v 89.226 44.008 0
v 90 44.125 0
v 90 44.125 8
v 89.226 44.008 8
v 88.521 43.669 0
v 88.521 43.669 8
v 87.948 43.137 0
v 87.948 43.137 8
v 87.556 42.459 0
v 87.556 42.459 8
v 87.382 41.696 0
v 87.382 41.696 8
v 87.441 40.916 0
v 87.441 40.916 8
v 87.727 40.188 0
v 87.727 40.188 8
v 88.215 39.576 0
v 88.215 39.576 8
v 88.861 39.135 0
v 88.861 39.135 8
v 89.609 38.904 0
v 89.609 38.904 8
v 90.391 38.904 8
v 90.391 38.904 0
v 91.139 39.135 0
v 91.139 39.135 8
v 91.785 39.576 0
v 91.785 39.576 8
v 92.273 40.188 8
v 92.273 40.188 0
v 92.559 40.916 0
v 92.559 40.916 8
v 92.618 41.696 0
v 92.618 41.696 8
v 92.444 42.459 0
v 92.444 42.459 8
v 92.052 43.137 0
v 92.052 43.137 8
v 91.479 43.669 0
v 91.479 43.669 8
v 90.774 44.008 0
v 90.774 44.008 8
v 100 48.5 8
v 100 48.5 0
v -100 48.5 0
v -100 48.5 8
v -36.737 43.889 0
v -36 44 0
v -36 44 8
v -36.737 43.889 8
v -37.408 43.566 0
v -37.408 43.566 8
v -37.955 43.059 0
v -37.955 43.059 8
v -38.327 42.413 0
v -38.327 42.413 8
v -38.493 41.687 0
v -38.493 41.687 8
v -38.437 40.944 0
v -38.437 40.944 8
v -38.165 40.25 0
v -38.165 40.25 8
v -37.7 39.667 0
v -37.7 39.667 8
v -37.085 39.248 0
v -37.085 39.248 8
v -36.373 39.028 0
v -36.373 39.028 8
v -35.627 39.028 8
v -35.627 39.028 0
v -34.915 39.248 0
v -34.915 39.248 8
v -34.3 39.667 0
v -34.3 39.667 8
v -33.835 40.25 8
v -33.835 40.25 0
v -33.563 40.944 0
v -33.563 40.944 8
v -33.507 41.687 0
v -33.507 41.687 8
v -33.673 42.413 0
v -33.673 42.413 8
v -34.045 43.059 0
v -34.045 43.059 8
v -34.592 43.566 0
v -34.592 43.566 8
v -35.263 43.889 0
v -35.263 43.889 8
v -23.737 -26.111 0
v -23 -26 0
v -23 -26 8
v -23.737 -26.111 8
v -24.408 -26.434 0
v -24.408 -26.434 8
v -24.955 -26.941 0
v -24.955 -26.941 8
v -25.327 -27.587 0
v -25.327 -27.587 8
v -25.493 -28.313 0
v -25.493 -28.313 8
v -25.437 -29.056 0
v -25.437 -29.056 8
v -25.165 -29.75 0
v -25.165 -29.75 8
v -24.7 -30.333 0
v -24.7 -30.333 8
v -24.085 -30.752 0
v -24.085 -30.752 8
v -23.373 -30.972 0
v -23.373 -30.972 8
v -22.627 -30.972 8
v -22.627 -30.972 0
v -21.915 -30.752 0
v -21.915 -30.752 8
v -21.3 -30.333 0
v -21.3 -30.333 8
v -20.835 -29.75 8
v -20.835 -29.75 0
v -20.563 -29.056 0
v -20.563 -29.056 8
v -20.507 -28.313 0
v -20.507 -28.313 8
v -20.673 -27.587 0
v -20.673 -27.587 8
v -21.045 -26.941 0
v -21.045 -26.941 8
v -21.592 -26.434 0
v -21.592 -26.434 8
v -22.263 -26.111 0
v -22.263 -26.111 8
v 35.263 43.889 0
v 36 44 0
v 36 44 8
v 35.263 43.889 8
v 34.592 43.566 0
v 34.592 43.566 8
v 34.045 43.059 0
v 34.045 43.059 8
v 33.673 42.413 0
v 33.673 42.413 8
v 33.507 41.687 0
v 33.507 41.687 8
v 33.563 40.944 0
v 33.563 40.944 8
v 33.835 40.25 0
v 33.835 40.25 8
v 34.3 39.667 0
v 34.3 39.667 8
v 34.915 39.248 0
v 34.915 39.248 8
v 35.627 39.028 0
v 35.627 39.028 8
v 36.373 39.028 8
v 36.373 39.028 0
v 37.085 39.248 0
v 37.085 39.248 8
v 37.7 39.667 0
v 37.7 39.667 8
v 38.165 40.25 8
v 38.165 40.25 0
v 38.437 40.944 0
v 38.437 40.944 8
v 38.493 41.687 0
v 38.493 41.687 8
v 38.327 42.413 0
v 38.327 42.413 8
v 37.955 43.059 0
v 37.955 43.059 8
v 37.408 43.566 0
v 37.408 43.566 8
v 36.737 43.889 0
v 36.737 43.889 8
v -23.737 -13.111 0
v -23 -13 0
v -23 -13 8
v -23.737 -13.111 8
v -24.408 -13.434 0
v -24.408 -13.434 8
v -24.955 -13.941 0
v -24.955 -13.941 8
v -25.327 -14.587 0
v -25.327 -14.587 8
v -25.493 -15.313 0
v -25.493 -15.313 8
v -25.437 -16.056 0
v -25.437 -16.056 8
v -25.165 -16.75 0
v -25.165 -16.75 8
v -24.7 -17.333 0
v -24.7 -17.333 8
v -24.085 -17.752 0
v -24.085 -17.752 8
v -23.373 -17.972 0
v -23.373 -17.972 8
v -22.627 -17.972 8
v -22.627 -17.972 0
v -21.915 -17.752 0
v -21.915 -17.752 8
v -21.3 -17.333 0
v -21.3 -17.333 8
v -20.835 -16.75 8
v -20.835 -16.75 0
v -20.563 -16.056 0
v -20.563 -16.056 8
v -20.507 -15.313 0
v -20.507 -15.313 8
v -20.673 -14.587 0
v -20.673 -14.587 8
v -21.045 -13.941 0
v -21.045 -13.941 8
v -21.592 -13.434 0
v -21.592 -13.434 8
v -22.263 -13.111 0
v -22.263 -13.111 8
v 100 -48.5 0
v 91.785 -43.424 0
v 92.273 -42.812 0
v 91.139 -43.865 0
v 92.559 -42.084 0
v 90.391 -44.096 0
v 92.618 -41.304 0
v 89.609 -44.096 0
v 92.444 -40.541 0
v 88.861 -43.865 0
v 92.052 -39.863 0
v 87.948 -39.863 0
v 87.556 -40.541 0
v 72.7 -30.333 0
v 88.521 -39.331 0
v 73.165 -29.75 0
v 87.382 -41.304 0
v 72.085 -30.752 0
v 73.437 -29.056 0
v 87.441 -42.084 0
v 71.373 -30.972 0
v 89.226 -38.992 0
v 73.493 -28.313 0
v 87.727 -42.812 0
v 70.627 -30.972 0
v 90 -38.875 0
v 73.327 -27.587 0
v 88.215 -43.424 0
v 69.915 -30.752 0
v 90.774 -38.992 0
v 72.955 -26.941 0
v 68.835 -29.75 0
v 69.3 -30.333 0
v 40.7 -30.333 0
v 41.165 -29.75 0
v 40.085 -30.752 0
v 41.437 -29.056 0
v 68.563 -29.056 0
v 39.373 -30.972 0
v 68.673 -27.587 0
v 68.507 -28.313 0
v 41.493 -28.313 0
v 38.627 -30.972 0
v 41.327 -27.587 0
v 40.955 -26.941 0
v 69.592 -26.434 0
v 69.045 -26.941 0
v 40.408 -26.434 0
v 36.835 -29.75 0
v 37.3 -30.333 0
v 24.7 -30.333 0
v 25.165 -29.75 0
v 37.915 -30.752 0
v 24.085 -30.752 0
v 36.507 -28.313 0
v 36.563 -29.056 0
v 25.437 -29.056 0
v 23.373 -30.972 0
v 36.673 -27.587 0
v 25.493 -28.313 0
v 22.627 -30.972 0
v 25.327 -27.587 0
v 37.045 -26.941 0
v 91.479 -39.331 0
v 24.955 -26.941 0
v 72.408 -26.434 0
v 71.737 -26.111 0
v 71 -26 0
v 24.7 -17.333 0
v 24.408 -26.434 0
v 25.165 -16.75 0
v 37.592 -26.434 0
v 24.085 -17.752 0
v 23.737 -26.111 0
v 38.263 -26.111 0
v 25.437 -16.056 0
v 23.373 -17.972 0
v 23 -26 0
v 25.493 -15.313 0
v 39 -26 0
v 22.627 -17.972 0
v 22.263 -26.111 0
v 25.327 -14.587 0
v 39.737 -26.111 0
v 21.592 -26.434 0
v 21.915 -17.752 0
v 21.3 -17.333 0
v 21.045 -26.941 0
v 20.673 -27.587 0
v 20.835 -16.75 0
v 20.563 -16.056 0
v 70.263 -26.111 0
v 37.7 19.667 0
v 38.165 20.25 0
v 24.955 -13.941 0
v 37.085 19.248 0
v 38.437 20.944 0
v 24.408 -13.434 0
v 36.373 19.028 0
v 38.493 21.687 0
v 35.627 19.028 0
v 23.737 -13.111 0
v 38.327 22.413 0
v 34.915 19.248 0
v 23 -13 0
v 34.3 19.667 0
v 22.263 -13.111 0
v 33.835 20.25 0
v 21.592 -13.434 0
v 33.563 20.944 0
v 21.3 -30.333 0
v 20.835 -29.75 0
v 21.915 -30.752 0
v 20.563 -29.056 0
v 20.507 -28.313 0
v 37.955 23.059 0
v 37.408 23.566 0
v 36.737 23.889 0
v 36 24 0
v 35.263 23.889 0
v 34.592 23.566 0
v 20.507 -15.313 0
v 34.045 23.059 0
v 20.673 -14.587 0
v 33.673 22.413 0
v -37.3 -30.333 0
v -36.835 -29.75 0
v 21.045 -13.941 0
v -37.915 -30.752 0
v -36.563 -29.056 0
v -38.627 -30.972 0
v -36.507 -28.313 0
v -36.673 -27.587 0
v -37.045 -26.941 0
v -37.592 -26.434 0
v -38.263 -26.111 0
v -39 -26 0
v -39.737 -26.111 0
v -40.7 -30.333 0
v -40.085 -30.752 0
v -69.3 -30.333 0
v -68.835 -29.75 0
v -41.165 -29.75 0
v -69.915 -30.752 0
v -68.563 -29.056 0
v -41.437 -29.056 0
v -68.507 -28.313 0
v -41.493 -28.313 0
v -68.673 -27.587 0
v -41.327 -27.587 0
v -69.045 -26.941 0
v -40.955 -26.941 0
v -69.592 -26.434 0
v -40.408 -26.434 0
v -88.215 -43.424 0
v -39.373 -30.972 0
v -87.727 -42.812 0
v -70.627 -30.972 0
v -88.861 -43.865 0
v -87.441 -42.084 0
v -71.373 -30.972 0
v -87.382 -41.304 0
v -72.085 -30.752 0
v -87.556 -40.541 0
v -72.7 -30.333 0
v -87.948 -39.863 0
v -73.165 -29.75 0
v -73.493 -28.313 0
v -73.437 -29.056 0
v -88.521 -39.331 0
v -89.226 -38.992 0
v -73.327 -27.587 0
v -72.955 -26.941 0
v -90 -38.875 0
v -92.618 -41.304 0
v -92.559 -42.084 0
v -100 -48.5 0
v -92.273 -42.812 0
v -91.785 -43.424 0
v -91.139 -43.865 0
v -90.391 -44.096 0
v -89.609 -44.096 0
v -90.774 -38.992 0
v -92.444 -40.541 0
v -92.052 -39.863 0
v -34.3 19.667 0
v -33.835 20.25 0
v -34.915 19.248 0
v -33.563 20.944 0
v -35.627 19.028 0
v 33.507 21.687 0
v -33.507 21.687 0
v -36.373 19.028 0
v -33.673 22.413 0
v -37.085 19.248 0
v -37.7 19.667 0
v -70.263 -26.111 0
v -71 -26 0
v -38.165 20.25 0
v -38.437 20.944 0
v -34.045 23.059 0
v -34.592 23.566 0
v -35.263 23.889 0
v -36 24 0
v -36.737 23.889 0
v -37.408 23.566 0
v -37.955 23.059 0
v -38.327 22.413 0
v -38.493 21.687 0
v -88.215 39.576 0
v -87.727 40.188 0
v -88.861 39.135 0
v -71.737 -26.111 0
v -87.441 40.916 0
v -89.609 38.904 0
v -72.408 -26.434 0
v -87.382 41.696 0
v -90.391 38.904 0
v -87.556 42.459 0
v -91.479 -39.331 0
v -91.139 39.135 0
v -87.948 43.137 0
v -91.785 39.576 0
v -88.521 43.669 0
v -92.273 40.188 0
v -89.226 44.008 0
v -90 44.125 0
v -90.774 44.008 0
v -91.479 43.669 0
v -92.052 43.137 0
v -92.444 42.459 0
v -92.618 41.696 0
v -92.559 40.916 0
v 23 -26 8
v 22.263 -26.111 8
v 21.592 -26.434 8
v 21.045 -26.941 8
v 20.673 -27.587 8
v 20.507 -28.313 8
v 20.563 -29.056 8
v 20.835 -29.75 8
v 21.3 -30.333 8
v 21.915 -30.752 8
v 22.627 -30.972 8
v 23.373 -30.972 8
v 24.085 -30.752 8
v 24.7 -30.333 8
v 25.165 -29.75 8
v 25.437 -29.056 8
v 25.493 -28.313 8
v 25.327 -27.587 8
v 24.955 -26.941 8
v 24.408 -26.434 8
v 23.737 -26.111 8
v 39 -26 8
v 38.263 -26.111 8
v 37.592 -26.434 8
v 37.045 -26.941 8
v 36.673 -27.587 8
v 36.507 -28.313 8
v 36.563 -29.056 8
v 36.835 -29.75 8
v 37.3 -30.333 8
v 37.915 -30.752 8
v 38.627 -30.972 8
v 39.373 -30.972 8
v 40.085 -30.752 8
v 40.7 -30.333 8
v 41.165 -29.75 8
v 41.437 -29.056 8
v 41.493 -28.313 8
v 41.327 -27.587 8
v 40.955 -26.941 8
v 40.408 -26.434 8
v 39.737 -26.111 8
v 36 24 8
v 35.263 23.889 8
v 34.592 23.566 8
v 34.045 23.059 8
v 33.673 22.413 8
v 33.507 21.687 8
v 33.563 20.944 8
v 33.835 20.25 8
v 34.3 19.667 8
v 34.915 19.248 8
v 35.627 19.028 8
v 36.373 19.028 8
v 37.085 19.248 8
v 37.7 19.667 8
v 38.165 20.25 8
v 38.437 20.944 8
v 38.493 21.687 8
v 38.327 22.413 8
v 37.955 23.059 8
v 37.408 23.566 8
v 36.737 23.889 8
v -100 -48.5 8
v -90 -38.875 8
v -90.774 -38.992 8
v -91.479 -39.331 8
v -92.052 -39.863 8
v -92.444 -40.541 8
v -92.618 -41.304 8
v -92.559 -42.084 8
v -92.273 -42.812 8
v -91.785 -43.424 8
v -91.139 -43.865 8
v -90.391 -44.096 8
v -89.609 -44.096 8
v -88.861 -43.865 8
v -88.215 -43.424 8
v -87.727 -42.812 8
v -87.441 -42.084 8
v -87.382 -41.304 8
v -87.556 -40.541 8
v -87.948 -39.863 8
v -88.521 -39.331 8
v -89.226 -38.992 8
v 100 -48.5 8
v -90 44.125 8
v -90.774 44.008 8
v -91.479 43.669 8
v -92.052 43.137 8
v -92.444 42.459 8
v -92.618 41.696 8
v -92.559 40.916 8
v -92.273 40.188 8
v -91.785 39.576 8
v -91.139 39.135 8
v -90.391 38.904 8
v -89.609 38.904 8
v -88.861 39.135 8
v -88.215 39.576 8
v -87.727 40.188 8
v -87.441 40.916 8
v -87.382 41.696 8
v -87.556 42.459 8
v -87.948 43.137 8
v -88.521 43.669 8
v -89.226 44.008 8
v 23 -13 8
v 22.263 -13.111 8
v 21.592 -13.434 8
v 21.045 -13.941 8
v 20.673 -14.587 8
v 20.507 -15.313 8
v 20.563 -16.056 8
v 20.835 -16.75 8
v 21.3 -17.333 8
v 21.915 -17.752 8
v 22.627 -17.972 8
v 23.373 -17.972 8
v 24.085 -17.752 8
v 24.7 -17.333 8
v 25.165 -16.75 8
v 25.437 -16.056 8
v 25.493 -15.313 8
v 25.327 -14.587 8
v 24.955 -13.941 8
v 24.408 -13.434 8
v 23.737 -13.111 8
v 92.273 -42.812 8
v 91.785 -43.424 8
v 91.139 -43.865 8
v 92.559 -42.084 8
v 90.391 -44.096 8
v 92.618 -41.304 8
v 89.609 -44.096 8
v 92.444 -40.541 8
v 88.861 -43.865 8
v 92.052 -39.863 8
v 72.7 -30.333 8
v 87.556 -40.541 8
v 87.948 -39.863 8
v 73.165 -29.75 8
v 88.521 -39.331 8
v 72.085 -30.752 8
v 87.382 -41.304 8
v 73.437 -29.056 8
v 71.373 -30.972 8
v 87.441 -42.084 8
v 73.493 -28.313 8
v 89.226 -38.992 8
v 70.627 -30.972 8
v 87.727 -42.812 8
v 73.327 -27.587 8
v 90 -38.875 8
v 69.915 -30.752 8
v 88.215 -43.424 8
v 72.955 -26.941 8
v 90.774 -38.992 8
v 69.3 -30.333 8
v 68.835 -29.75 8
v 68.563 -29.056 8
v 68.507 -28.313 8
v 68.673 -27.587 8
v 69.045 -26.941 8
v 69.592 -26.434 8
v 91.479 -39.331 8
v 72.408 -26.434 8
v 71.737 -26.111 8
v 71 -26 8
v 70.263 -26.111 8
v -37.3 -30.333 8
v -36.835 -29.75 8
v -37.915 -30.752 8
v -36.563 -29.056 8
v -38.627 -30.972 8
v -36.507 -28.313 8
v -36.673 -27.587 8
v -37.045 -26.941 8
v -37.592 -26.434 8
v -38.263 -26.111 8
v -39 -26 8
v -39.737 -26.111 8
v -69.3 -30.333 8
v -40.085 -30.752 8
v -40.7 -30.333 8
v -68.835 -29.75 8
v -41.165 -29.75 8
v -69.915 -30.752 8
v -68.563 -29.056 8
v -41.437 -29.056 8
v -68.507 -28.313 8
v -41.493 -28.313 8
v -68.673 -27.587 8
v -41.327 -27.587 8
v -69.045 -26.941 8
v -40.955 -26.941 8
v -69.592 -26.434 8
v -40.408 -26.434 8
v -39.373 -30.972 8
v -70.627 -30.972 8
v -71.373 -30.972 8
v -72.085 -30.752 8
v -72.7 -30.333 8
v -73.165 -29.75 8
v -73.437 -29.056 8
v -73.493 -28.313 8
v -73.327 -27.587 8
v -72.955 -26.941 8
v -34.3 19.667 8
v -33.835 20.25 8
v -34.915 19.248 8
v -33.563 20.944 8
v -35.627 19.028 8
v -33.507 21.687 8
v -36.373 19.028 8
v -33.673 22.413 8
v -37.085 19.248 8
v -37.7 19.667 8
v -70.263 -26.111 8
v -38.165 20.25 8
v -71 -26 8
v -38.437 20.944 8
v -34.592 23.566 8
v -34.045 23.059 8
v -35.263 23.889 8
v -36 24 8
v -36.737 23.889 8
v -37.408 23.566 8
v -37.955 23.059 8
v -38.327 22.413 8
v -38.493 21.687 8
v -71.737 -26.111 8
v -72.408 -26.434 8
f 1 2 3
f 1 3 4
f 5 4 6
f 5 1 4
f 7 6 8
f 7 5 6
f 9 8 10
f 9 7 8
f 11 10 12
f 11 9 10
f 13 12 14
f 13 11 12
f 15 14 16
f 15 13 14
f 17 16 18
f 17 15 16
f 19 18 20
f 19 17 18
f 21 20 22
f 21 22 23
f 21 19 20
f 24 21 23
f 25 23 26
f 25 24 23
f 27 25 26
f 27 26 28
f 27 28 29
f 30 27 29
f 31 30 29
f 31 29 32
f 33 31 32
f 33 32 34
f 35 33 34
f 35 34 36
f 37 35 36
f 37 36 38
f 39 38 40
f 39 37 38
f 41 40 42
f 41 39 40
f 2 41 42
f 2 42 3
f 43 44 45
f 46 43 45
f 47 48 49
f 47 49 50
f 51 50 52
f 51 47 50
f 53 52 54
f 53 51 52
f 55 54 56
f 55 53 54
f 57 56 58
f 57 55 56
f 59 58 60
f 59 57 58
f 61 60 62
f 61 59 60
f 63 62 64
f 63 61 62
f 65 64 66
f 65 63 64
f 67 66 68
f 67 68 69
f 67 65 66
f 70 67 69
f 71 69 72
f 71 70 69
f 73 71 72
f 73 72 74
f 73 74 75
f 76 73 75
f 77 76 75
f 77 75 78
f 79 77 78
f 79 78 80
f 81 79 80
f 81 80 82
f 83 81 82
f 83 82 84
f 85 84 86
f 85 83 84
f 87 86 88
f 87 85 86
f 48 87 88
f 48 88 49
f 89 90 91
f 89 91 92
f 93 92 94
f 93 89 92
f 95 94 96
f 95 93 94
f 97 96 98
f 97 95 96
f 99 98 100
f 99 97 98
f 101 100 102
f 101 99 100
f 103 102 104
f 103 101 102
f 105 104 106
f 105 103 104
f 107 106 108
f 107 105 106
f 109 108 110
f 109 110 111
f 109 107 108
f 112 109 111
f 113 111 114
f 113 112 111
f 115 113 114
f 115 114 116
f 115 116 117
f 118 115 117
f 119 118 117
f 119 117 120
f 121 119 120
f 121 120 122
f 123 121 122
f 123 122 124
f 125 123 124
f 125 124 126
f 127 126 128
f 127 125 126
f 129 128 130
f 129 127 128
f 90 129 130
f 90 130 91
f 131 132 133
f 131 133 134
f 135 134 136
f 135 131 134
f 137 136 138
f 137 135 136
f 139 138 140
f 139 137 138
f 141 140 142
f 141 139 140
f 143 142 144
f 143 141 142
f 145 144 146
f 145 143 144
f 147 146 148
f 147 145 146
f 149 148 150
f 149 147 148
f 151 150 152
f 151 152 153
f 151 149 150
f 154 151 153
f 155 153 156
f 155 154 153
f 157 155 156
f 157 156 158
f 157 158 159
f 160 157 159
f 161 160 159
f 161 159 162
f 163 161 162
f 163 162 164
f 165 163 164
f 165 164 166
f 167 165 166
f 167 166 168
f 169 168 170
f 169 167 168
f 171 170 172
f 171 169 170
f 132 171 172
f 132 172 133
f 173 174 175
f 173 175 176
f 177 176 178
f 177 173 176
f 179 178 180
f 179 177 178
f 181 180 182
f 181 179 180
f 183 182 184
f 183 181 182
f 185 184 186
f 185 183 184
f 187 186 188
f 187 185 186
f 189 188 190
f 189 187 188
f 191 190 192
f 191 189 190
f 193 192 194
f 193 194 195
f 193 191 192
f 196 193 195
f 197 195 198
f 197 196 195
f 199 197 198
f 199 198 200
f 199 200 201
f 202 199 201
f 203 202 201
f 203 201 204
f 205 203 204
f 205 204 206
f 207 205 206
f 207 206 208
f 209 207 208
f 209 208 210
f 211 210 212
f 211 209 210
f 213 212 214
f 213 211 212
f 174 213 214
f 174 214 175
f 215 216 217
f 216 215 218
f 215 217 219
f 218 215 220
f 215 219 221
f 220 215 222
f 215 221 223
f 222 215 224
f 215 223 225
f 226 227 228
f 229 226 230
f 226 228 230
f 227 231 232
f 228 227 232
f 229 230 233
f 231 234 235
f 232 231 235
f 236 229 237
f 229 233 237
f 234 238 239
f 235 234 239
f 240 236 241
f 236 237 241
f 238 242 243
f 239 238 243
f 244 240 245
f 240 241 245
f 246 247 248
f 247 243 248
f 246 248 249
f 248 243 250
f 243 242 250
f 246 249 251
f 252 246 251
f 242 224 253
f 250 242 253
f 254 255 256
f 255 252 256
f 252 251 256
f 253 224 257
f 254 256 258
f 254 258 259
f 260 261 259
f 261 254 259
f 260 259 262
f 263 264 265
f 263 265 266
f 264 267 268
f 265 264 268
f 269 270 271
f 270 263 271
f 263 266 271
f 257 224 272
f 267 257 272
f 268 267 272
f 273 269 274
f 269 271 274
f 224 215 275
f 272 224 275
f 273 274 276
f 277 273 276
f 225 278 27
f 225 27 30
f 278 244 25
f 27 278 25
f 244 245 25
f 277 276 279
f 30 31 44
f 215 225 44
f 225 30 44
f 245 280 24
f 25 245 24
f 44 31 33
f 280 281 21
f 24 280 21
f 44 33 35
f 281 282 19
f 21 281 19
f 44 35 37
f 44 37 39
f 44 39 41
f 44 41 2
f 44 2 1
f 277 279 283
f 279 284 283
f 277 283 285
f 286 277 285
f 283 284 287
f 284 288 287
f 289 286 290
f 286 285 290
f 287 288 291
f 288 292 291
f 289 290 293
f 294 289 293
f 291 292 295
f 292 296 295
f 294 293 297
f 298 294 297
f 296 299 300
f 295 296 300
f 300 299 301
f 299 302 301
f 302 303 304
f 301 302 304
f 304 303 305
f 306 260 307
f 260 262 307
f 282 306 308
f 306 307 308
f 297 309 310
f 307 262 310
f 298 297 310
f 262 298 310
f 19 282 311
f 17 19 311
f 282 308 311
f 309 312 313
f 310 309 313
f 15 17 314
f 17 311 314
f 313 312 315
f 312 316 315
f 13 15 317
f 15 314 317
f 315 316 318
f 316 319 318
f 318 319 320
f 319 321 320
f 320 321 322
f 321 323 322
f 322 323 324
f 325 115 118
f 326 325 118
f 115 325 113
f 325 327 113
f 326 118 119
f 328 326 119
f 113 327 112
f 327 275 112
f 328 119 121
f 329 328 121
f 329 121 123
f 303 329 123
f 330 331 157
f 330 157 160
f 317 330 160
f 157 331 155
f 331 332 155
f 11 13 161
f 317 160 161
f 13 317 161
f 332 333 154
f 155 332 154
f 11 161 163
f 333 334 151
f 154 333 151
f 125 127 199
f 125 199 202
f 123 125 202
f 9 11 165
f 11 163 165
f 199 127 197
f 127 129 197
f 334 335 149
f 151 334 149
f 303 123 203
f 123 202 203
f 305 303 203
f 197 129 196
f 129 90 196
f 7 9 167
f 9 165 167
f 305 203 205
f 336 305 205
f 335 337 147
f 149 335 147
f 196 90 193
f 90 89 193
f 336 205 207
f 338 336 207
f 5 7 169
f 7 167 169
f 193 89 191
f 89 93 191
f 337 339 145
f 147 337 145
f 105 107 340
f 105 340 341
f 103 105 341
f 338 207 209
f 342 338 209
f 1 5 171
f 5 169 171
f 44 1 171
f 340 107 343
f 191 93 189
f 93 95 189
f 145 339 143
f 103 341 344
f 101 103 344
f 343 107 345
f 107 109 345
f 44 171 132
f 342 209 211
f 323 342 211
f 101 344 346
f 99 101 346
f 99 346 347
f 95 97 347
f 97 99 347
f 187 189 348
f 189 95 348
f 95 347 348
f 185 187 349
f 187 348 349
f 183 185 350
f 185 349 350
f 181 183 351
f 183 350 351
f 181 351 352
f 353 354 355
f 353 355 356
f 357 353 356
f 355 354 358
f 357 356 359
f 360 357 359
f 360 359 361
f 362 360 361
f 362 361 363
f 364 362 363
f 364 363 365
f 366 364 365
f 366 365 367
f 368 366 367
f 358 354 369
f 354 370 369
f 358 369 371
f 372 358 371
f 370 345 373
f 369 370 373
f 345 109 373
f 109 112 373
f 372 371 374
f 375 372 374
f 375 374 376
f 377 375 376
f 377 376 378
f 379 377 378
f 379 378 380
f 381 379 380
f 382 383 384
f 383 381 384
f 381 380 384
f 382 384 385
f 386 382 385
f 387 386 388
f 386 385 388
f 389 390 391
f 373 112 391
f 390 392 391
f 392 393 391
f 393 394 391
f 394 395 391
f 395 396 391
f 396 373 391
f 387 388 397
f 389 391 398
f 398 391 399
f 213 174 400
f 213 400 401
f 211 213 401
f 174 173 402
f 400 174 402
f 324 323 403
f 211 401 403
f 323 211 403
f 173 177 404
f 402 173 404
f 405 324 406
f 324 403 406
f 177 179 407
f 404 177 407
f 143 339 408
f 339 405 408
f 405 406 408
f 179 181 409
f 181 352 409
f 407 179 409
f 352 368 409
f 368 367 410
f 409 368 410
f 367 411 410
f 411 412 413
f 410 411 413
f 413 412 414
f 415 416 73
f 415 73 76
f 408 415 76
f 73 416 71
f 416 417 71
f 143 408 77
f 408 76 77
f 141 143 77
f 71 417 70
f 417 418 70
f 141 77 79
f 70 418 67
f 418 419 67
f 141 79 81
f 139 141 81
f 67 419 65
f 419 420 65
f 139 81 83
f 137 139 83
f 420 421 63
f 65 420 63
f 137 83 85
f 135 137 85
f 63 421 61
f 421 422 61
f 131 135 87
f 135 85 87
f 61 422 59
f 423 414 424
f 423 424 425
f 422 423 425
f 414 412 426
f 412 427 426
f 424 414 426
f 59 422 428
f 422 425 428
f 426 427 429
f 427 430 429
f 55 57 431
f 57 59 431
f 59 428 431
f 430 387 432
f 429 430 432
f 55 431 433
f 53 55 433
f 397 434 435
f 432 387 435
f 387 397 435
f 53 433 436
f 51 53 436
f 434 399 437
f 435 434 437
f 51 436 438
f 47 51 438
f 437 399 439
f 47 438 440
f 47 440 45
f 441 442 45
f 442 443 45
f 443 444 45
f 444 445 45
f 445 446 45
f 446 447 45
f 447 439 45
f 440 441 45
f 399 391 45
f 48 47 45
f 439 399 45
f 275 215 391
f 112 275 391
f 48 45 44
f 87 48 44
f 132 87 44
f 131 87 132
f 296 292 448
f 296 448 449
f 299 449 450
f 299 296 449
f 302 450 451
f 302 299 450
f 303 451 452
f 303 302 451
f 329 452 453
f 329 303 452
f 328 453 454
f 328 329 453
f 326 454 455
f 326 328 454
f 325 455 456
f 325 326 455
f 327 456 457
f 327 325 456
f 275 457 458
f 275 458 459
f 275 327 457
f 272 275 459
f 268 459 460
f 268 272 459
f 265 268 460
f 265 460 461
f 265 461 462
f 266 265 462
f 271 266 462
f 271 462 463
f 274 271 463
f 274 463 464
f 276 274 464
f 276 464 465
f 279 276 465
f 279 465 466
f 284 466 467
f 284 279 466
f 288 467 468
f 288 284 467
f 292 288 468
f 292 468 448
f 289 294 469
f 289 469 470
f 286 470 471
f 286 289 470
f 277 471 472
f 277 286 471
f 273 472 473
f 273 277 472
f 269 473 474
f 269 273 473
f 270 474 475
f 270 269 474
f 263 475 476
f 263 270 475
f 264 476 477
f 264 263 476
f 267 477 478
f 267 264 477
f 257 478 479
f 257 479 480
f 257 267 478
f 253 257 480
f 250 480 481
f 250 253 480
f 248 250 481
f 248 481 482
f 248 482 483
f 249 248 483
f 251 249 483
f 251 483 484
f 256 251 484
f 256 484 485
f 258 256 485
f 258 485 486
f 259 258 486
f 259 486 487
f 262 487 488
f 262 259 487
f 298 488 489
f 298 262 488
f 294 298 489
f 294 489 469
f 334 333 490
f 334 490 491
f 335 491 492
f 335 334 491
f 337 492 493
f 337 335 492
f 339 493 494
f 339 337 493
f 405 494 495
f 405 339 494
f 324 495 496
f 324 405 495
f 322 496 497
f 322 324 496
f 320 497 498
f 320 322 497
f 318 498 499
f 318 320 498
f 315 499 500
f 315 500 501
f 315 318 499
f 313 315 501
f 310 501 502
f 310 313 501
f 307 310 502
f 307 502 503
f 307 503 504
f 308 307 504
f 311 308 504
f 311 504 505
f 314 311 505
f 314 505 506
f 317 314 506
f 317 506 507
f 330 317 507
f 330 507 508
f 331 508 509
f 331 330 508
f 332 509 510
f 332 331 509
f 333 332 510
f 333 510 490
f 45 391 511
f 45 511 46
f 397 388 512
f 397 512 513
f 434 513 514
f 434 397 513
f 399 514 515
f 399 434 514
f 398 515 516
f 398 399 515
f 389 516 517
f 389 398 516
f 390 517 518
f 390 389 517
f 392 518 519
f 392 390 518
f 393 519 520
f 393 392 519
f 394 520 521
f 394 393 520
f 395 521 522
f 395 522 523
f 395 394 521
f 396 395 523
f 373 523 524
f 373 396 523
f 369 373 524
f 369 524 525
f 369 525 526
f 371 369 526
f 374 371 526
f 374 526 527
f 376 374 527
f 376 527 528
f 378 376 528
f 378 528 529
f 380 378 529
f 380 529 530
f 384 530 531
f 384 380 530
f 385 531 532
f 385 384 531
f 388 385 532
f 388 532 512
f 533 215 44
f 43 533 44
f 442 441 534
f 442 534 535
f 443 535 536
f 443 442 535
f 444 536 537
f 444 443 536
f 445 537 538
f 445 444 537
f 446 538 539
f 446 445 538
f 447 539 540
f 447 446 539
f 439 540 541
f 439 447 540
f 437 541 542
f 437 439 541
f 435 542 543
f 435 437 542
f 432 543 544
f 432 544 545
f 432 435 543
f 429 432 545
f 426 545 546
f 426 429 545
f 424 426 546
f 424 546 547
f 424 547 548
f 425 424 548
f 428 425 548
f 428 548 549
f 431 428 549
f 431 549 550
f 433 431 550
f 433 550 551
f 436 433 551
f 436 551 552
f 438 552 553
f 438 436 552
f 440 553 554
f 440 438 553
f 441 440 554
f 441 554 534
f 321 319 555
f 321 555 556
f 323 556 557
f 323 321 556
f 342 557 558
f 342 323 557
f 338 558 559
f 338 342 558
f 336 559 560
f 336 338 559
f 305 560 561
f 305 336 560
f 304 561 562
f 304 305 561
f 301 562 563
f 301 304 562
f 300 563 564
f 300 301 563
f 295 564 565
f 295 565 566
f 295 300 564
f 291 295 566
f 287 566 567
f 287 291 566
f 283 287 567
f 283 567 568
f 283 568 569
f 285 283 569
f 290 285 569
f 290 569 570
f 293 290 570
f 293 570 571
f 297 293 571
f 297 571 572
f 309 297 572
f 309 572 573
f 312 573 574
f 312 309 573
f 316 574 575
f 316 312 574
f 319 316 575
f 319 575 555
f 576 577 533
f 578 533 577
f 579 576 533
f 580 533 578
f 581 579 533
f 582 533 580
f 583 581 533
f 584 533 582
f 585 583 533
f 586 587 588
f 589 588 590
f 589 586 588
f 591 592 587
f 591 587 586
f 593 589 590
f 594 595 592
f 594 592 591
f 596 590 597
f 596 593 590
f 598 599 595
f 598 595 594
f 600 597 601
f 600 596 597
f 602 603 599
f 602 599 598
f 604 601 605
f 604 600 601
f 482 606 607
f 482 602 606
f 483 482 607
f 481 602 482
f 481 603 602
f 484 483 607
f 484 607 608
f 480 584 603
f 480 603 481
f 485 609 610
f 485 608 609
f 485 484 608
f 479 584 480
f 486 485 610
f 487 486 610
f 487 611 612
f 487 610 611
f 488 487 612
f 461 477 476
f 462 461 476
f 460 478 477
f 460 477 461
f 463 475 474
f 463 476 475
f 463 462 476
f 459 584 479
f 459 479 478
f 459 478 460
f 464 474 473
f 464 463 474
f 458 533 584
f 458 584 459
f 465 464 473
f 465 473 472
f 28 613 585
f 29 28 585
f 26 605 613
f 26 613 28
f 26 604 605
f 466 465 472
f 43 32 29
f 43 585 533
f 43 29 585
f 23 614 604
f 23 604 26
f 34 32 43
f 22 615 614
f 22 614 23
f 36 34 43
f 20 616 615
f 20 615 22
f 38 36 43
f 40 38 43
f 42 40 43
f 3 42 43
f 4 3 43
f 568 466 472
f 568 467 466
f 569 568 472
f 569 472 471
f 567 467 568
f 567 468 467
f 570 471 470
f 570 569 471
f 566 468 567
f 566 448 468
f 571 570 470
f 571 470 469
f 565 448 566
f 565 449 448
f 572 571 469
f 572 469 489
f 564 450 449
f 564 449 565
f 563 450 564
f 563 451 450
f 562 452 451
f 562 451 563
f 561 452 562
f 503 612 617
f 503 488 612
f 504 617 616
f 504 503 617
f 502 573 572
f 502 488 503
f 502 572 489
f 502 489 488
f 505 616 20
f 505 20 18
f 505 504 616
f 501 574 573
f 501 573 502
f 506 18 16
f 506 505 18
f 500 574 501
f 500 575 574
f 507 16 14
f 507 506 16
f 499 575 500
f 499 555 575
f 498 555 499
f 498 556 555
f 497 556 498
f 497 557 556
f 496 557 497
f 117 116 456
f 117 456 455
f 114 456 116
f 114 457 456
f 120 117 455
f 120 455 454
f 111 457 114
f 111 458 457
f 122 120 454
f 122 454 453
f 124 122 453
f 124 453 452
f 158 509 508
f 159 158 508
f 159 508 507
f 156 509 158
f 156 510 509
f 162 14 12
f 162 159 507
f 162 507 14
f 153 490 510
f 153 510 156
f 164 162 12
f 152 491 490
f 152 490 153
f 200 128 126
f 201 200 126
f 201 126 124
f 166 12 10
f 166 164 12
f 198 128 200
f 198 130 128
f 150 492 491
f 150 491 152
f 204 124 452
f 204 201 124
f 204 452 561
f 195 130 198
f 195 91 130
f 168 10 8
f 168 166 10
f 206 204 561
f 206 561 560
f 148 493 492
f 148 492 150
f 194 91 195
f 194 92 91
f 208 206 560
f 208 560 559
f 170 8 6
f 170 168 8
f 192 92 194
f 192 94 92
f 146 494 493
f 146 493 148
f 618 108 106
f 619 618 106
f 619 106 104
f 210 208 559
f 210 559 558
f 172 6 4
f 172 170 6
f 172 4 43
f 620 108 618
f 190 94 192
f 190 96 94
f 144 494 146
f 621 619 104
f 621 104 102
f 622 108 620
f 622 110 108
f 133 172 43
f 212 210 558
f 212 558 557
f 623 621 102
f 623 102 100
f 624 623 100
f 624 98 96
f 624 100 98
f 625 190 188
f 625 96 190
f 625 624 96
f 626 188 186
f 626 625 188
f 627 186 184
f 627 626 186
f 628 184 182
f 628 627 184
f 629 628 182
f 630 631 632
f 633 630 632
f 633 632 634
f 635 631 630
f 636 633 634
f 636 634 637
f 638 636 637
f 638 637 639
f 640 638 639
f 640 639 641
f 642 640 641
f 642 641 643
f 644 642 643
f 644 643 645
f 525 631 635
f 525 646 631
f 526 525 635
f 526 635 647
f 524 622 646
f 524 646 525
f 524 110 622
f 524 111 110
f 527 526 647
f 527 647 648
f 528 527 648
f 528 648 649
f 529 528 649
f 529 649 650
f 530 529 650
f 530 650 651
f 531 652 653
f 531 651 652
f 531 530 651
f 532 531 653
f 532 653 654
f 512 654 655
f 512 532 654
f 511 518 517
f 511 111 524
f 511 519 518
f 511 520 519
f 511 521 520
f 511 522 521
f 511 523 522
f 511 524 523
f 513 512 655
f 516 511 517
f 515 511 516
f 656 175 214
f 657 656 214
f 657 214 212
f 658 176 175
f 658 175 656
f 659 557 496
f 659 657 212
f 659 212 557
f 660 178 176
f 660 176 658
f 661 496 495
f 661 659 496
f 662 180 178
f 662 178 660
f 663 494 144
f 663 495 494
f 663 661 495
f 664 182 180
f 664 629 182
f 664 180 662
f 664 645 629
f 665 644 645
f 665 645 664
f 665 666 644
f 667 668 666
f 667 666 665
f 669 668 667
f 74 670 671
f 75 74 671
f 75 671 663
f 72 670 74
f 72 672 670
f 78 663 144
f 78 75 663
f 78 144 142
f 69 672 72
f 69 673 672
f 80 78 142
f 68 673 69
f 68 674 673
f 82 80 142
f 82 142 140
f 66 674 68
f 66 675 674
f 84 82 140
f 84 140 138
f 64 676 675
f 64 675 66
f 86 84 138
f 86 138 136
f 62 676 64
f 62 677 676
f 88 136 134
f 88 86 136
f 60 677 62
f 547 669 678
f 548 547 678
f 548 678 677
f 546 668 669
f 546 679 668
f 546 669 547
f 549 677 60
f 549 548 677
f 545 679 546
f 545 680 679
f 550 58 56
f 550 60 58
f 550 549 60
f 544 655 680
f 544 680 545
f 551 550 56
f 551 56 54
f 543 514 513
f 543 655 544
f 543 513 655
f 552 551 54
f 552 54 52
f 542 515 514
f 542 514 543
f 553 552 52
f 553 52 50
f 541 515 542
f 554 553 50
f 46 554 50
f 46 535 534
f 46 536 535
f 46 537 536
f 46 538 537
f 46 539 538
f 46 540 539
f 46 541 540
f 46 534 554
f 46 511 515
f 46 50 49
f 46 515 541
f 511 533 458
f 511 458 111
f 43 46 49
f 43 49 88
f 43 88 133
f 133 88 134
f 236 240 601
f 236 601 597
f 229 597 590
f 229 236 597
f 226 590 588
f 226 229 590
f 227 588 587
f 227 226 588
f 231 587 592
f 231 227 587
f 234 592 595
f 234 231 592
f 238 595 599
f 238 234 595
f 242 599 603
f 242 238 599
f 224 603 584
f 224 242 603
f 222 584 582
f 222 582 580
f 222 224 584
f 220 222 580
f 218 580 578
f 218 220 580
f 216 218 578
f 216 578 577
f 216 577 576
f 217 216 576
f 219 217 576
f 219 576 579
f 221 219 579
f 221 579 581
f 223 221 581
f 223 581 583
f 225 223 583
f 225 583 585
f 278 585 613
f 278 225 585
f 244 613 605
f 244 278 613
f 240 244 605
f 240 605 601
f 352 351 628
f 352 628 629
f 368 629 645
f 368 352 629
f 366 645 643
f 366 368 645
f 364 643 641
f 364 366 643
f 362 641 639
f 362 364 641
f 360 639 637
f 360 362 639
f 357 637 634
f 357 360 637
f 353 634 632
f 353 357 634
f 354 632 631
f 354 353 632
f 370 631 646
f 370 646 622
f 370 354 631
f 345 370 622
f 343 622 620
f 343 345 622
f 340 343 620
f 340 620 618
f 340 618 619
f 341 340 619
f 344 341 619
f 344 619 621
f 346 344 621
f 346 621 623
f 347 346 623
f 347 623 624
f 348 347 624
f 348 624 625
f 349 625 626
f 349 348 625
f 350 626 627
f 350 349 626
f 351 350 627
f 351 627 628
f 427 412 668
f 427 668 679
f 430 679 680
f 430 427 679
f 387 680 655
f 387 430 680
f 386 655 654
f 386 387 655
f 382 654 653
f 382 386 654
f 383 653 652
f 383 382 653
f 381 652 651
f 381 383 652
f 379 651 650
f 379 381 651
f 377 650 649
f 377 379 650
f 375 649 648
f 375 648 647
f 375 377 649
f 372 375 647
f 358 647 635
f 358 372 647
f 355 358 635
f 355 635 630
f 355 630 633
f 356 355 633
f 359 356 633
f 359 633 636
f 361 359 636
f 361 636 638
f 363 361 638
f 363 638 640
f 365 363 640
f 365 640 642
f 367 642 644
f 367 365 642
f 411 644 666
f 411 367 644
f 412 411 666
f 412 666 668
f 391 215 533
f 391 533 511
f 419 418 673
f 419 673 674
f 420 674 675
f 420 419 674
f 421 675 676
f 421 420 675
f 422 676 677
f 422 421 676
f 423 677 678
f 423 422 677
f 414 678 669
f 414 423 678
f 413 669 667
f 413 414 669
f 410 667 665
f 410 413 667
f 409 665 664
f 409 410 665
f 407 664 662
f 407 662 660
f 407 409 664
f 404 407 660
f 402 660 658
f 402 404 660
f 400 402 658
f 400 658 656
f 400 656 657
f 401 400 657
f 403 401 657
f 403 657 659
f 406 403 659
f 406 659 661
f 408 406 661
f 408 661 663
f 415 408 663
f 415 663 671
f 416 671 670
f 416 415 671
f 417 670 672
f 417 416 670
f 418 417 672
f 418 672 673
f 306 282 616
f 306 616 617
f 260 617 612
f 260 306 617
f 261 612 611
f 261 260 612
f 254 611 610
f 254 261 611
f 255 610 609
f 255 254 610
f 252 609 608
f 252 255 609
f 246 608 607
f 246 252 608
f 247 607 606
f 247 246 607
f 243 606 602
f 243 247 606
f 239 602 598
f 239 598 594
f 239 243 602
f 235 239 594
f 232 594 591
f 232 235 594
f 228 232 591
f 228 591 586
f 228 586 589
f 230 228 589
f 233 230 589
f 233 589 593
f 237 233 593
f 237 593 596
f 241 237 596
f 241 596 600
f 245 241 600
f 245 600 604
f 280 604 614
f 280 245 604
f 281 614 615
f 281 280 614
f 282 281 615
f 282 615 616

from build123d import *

# Parameters (mm, degrees)
SKETCH_W   = 97
SKETCH_H   = 200
SKETCH_R   = 2.5
SKETCH_R_2 = 2.625
PAD_DEPTH  = 8


with BuildPart() as part:
    # Sketch → Pad (new body)
    with BuildSketch(Plane(origin=(0, 0, 0), x_dir=(0, 1, 0), z_dir=(0, 0, 1))):
        Rectangle(SKETCH_W, SKETCH_H)
        with Locations((-28.5, 71)):
            Circle(SKETCH_R, mode=Mode.SUBTRACT)
        with Locations((-28.5, 39)):
            Circle(SKETCH_R, mode=Mode.SUBTRACT)
        with Locations((-28.5, -39)):
            Circle(SKETCH_R, mode=Mode.SUBTRACT)
        with Locations((-28.5, -71)):
            Circle(SKETCH_R, mode=Mode.SUBTRACT)
        with Locations((-28.5, 23)):
            Circle(SKETCH_R, mode=Mode.SUBTRACT)
        with Locations((-15.5, 23)):
            Circle(SKETCH_R, mode=Mode.SUBTRACT)
        with Locations((-28.5, -23)):
            Circle(SKETCH_R, mode=Mode.SUBTRACT)
        with Locations((-15.5, -23)):
            Circle(SKETCH_R, mode=Mode.SUBTRACT)
        with Locations((-41.5, 90)):
            Circle(SKETCH_R_2, mode=Mode.SUBTRACT)
        with Locations((41.5, 90)):
            Circle(SKETCH_R_2, mode=Mode.SUBTRACT)
        with Locations((-41.5, -90)):
            Circle(SKETCH_R_2, mode=Mode.SUBTRACT)
        with Locations((41.5, -90)):
            Circle(SKETCH_R_2, mode=Mode.SUBTRACT)
        with Locations((21.5, 36)):
            Circle(SKETCH_R, mode=Mode.SUBTRACT)
        with Locations((41.5, 36)):
            Circle(SKETCH_R, mode=Mode.SUBTRACT)
        with Locations((21.5, -36)):
            Circle(SKETCH_R, mode=Mode.SUBTRACT)
        with Locations((41.5, -36)):
            Circle(SKETCH_R, mode=Mode.SUBTRACT)
    extrude(amount=PAD_DEPTH)


solid = part.part
